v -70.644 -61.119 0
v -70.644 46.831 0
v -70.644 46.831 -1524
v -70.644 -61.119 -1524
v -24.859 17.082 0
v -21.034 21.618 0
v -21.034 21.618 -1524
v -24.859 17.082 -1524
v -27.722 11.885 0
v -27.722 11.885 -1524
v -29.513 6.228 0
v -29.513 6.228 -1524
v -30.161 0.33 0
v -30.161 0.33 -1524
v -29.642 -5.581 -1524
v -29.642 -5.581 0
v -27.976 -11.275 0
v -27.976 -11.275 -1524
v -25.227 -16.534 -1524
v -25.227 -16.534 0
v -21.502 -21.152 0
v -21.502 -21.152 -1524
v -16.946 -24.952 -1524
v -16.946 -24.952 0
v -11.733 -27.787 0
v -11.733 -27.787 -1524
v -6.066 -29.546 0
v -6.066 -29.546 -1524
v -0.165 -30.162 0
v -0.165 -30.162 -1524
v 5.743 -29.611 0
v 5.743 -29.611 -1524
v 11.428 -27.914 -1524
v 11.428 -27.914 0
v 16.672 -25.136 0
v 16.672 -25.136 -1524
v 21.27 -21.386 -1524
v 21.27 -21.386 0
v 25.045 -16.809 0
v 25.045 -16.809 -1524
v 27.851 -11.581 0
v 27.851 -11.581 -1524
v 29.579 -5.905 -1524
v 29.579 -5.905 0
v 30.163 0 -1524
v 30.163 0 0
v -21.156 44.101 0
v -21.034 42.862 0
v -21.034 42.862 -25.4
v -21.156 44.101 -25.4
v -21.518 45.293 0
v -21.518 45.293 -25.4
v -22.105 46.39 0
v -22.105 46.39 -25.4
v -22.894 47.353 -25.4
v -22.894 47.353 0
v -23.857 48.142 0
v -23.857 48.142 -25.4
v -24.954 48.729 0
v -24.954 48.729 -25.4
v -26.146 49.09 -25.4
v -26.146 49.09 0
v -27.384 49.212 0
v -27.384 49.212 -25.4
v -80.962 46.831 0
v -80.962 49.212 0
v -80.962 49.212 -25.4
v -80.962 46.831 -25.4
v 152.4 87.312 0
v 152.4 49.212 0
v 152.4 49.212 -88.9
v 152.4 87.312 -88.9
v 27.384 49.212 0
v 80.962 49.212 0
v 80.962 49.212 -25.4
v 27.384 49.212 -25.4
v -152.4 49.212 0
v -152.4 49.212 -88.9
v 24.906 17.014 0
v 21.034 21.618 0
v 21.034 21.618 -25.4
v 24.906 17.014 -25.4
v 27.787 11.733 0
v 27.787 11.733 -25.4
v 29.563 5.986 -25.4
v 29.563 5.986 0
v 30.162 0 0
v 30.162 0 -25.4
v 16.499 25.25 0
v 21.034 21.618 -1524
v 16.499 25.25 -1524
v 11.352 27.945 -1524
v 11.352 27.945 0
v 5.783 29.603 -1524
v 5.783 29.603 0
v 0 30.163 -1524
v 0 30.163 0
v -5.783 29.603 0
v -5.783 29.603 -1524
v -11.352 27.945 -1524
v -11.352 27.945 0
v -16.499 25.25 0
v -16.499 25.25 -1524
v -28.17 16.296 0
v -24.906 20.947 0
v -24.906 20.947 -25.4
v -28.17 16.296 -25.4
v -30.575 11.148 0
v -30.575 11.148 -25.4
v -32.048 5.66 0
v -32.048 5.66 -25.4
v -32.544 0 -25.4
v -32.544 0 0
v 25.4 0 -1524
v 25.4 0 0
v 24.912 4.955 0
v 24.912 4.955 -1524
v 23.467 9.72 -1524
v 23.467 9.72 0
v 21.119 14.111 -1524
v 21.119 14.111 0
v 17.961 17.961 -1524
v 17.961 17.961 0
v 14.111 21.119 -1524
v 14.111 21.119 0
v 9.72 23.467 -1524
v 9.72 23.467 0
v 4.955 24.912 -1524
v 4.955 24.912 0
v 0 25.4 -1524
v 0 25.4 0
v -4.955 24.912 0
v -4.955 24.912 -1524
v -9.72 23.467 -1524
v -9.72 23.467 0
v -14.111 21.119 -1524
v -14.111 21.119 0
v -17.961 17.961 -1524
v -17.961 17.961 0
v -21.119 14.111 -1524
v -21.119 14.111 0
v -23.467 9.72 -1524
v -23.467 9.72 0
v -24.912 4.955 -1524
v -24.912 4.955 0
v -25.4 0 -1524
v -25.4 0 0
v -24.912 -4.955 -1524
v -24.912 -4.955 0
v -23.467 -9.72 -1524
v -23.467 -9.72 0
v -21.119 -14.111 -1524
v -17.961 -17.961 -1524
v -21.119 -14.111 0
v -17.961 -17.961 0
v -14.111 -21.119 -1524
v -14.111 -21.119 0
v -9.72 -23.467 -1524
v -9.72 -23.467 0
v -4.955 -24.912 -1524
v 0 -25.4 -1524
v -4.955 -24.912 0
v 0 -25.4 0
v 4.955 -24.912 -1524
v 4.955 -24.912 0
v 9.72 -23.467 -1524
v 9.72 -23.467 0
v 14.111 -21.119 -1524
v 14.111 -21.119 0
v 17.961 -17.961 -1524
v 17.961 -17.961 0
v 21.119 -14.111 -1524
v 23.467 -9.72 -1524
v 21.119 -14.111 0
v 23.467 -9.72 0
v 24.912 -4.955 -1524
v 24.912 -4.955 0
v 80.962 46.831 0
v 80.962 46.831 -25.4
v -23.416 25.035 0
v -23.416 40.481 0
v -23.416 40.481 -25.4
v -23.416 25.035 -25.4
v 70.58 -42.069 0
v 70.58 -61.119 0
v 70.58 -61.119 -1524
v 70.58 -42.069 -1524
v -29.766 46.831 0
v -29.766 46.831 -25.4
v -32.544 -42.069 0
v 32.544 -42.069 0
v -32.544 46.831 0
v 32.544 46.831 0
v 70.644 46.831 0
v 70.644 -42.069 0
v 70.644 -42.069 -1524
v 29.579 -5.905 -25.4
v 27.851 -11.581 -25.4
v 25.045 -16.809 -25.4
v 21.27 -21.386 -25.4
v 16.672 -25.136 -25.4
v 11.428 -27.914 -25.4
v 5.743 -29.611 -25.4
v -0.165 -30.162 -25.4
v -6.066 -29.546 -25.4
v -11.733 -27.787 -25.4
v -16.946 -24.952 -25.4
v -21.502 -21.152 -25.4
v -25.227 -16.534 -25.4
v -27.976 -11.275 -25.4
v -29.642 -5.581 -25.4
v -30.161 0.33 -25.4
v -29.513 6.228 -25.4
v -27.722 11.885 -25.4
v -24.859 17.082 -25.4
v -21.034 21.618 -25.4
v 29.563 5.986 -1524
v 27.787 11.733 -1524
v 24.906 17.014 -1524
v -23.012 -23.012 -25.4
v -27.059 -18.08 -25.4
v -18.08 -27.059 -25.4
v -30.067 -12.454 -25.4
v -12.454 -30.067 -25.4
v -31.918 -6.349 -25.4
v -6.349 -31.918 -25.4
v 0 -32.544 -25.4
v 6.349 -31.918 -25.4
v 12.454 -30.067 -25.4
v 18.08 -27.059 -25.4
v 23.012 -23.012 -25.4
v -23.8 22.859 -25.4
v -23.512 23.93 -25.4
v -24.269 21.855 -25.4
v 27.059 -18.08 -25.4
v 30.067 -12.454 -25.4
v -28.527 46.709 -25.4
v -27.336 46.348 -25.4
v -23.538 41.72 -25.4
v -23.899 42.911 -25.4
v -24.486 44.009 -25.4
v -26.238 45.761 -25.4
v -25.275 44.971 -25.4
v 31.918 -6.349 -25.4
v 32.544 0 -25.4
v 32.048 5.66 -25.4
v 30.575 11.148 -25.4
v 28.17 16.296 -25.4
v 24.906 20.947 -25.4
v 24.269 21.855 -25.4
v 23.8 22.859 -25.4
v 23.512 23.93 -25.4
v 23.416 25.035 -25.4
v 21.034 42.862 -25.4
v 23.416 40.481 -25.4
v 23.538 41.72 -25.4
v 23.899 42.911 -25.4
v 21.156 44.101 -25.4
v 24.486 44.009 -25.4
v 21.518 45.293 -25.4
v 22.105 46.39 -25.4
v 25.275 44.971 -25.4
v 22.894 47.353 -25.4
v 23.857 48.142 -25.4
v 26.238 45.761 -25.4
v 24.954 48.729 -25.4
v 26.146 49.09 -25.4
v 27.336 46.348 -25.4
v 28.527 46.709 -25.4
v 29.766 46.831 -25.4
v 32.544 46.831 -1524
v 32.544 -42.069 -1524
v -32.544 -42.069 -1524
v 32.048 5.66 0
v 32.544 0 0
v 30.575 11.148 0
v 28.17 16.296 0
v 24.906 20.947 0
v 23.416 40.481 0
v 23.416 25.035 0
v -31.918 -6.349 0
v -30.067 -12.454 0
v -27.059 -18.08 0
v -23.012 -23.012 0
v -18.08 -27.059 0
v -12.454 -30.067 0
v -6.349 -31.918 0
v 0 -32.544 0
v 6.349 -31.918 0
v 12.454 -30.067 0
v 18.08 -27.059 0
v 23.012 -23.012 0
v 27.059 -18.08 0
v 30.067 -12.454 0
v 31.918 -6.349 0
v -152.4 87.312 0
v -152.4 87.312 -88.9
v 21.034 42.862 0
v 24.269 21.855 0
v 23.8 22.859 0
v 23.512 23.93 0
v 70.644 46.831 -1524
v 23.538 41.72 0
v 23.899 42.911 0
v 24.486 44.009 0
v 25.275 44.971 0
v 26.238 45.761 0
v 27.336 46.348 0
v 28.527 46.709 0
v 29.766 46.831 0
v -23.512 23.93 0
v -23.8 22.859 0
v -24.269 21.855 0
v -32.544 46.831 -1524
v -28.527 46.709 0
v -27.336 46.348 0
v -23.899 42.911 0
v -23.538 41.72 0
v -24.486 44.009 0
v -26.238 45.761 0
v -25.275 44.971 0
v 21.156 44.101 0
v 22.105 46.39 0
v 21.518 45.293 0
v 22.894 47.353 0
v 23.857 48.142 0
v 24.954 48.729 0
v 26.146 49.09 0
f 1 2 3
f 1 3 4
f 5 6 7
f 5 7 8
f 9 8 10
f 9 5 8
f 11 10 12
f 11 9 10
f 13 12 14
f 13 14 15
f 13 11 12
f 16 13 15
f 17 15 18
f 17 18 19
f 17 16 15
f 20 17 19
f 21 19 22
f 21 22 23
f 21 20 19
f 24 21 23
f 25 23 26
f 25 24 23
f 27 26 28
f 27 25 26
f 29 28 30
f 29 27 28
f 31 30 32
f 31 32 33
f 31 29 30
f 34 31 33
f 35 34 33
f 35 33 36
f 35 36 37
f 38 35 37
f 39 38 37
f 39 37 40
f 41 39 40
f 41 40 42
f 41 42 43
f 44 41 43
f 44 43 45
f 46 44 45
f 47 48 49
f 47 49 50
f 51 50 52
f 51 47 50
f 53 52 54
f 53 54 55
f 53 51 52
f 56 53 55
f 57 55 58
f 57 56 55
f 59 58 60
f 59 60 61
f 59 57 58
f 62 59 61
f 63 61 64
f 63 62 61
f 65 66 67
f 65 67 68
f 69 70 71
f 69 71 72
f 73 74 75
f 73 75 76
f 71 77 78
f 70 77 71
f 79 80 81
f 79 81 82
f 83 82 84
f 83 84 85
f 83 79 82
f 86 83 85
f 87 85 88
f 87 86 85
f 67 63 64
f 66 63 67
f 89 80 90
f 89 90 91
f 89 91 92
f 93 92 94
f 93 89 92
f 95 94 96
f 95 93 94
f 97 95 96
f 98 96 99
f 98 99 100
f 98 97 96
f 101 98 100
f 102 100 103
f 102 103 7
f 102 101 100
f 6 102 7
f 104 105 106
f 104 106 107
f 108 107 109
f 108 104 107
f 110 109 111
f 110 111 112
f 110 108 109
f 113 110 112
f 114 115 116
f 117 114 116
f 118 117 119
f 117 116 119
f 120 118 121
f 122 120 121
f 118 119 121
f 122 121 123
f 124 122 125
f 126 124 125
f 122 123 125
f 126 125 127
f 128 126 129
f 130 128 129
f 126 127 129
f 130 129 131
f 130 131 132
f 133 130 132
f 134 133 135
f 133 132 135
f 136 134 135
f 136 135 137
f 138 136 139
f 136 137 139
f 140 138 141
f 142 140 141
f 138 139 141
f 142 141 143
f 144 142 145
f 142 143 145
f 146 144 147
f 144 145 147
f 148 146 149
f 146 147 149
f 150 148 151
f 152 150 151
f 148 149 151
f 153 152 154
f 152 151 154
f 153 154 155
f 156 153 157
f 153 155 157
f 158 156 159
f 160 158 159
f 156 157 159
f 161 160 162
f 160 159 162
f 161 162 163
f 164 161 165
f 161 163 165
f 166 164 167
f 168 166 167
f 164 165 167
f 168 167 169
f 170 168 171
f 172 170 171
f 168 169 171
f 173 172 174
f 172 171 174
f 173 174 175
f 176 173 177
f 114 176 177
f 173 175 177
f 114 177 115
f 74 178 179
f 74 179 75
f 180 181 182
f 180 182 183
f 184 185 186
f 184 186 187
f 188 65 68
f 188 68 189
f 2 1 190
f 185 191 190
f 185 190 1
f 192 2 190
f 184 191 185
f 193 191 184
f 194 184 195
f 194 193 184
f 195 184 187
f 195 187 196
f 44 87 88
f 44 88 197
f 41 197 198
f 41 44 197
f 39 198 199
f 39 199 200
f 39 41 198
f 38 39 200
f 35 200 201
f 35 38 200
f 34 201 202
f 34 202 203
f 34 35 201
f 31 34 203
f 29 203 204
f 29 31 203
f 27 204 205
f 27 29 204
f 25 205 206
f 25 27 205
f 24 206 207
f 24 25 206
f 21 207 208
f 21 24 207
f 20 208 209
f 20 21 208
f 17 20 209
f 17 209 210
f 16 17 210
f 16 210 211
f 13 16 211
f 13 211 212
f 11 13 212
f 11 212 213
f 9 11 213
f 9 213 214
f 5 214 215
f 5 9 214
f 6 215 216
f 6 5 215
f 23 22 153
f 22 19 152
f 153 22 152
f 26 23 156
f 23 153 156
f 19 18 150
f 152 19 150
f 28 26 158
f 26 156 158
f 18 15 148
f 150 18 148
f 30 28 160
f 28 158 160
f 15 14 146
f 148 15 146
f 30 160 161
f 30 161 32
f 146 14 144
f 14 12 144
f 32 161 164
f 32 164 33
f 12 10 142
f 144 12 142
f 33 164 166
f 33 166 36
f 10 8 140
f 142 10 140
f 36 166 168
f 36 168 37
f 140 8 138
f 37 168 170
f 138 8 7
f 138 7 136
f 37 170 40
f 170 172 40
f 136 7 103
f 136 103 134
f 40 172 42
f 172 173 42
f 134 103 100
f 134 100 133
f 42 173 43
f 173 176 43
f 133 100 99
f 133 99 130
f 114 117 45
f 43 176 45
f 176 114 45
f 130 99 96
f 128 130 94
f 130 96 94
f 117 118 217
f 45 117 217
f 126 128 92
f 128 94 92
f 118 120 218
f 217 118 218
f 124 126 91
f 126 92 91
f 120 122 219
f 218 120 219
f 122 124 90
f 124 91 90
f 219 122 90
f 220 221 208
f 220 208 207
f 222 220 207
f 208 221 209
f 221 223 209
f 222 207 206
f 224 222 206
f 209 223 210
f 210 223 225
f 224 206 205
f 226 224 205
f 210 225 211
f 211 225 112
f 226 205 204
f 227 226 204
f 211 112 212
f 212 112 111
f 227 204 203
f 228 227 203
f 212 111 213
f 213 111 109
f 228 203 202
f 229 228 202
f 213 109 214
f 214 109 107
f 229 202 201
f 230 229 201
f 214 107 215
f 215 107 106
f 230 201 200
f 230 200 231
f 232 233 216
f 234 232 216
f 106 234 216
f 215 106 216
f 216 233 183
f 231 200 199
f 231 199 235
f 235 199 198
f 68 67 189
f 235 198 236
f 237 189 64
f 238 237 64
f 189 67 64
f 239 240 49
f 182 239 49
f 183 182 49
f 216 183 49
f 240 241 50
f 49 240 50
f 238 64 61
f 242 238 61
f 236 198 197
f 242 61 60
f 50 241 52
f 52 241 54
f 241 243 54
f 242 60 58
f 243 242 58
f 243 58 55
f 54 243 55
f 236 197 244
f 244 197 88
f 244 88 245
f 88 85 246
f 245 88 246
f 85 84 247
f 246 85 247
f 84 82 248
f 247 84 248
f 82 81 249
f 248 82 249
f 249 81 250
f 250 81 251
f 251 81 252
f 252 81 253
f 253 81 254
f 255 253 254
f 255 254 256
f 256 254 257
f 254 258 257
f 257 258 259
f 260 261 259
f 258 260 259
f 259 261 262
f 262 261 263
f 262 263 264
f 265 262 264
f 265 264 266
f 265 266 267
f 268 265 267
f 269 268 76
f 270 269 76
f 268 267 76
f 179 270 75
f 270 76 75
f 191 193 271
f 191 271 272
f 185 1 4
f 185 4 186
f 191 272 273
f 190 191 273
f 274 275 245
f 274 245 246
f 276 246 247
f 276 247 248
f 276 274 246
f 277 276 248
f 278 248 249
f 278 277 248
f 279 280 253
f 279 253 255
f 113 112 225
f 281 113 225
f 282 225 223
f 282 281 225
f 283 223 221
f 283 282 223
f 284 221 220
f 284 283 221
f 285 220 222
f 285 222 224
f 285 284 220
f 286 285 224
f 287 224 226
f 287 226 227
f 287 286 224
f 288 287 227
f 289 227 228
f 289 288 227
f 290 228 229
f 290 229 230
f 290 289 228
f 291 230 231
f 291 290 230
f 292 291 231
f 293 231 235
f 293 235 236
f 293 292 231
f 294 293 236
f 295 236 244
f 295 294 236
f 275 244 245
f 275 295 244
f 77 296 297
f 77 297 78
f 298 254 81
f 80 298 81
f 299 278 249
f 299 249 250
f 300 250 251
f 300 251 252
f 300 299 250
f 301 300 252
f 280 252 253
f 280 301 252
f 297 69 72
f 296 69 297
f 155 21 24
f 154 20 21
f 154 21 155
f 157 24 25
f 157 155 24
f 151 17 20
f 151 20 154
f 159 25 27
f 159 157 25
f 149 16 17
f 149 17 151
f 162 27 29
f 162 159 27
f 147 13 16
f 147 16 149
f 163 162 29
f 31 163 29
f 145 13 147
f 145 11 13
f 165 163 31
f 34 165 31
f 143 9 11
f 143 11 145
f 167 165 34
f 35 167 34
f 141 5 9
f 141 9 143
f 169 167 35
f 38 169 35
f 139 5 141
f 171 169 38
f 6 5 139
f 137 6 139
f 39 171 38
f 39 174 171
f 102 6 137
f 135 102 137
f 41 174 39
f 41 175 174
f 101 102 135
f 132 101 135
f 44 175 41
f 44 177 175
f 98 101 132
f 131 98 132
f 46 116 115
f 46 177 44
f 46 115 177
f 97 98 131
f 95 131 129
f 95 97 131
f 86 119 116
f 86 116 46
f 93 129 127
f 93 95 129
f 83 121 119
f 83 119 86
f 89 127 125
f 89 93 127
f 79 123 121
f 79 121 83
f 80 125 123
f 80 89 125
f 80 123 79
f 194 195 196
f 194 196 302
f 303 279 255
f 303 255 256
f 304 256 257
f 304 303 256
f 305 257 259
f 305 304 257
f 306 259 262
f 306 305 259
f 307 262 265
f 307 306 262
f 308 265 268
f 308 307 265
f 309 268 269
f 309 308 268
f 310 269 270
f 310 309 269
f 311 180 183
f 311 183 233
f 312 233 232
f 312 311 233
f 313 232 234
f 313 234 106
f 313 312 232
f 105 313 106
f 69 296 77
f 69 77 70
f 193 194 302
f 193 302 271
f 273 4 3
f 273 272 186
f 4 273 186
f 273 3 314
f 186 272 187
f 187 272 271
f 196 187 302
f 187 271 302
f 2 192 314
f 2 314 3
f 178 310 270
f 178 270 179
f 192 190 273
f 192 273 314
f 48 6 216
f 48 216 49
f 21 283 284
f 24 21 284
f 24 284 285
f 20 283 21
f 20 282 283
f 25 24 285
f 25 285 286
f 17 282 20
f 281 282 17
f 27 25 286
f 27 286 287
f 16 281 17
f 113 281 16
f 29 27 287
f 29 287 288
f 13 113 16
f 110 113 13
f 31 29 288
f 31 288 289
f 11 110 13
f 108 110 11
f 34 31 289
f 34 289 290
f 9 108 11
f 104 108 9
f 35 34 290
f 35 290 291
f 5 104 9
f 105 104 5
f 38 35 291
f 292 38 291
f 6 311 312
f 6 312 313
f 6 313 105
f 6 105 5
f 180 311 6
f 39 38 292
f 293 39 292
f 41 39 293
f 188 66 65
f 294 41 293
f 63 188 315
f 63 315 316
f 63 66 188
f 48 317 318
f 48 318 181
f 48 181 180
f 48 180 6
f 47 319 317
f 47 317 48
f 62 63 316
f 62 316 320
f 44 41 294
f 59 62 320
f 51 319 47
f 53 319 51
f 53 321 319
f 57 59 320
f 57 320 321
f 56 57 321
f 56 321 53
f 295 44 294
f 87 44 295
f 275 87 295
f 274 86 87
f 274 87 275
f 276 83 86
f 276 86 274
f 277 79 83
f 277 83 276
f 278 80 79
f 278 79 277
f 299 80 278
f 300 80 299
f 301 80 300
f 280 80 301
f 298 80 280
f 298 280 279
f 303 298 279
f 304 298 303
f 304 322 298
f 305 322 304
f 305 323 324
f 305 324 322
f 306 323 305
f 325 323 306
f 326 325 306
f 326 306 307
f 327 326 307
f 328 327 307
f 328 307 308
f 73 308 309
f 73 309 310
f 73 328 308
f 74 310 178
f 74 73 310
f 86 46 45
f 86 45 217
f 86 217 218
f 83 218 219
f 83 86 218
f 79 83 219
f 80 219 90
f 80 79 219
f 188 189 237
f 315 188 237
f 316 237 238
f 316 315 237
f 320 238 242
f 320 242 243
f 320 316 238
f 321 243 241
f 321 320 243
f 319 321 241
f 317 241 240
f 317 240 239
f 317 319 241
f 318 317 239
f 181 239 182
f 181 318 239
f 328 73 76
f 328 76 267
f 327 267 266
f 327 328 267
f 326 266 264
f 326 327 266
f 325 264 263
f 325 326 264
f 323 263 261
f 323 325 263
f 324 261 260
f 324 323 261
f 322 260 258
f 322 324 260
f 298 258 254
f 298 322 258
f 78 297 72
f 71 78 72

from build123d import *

# Parameters (mm, degrees)
F0_R     = 25.4
F1_DEPTH = 1524
F2_DEPTH = 25.4
F3_DEPTH = 88.9


with BuildPart() as f1:
    # F0 (on Top) → F1 (new body)
    with BuildSketch(Plane.XY):
        Polygon((-32.54375, 46.83125), (-70.64375, 46.83125), (-70.64375, -42.06875), (-32.54375, -42.06875), (-32.54375, 0), align=None)
        Polygon((70.64375, -42.06875), (70.64375, 46.83125), (32.54375, 46.83125), (32.54375, 0), (32.54375, -42.06875), (70.58025, -42.06875), align=None)
        Polygon((-32.54375, -42.06875), (-70.64375, -42.06875), (-70.64375, -61.11875), (70.58025, -61.11875), (70.58025, -42.06875), (32.54375, -42.06875), align=None)
        with BuildLine():
            ThreePointArc((-21.034375, 21.617851), (-11.73301, -27.786919), (30.1625, 0))
            ThreePointArc((30.1625, 0), (27.786919, 11.73301), (21.034375, 21.617851))
            ThreePointArc((21.034375, 21.617851), (0, 30.1625), (-21.034375, 21.617851))
        make_face()
        Circle(F0_R, mode=Mode.SUBTRACT)
    extrude(amount=-F1_DEPTH)


with BuildPart() as f2:
    # F0 (on Top) → F2 (new body)
    with BuildSketch(Plane.XY):
        with BuildLine():
            ThreePointArc((21.034375, 21.617851), (27.786919, 11.73301), (30.1625, 0))
            ThreePointArc((30.1625, 0), (-11.73301, -27.786919), (-21.034375, 21.617851))
            Line((-21.034375, 21.617851), (-21.034375, 42.8625))
            ThreePointArc((-21.034375, 42.8625), (-22.894247, 47.352628), (-27.384375, 49.2125))
            Line((-27.384375, 49.2125), (-80.9625, 49.2125))
            Line((-80.9625, 49.2125), (-80.9625, 46.83125))
            Line((-80.9625, 46.83125), (-70.64375, 46.83125))
            Line((-70.64375, 46.83125), (-32.54375, 46.83125))
            Line((-32.54375, 46.83125), (-29.765625, 46.83125))
            ThreePointArc((-29.765625, 46.83125), (-25.275497, 44.971378), (-23.415625, 40.48125))
            Line((-23.415625, 40.48125), (-23.415625, 25.034603))
            ThreePointArc((-23.415625, 25.034603), (-23.799824, 22.859351), (-24.905931, 20.947321))
            ThreePointArc((-24.905931, 20.947321), (-30.574729, 11.148167), (-32.54375, 0))
            ThreePointArc((-32.54375, 0), (0, -32.54375), (32.54375, 0))
            ThreePointArc((32.54375, 0), (30.574729, 11.148167), (24.905931, 20.947321))
            ThreePointArc((24.905931, 20.947321), (23.799824, 22.859351), (23.415625, 25.034603))
            Line((23.415625, 25.034603), (23.415625, 40.48125))
            ThreePointArc((23.415625, 40.48125), (25.275497, 44.971378), (29.765625, 46.83125))
            Line((29.765625, 46.83125), (32.54375, 46.83125))
            Line((32.54375, 46.83125), (70.64375, 46.83125))
            Line((70.64375, 46.83125), (80.9625, 46.83125))
            Line((80.9625, 46.83125), (80.9625, 49.2125))
            Line((80.9625, 49.2125), (27.384375, 49.2125))
            ThreePointArc((27.384375, 49.2125), (22.894247, 47.352628), (21.034375, 42.8625))
            Line((21.034375, 42.8625), (21.034375, 21.617851))
        make_face()
    extrude(amount=-F2_DEPTH)


with BuildPart() as f3:
    # F0 (on Top) → F3 (new body)
    with BuildSketch(Plane.XY):
        Polygon((-27.384375, 49.2125), (27.384375, 49.2125), (80.9625, 49.2125), (152.4, 49.2125), (152.4, 87.3125), (-152.4, 87.3125), (-152.4, 49.2125), (-80.9625, 49.2125), align=None)
    extrude(amount=-F3_DEPTH)


solid = Compound([f1.part, f2.part, f3.part])
